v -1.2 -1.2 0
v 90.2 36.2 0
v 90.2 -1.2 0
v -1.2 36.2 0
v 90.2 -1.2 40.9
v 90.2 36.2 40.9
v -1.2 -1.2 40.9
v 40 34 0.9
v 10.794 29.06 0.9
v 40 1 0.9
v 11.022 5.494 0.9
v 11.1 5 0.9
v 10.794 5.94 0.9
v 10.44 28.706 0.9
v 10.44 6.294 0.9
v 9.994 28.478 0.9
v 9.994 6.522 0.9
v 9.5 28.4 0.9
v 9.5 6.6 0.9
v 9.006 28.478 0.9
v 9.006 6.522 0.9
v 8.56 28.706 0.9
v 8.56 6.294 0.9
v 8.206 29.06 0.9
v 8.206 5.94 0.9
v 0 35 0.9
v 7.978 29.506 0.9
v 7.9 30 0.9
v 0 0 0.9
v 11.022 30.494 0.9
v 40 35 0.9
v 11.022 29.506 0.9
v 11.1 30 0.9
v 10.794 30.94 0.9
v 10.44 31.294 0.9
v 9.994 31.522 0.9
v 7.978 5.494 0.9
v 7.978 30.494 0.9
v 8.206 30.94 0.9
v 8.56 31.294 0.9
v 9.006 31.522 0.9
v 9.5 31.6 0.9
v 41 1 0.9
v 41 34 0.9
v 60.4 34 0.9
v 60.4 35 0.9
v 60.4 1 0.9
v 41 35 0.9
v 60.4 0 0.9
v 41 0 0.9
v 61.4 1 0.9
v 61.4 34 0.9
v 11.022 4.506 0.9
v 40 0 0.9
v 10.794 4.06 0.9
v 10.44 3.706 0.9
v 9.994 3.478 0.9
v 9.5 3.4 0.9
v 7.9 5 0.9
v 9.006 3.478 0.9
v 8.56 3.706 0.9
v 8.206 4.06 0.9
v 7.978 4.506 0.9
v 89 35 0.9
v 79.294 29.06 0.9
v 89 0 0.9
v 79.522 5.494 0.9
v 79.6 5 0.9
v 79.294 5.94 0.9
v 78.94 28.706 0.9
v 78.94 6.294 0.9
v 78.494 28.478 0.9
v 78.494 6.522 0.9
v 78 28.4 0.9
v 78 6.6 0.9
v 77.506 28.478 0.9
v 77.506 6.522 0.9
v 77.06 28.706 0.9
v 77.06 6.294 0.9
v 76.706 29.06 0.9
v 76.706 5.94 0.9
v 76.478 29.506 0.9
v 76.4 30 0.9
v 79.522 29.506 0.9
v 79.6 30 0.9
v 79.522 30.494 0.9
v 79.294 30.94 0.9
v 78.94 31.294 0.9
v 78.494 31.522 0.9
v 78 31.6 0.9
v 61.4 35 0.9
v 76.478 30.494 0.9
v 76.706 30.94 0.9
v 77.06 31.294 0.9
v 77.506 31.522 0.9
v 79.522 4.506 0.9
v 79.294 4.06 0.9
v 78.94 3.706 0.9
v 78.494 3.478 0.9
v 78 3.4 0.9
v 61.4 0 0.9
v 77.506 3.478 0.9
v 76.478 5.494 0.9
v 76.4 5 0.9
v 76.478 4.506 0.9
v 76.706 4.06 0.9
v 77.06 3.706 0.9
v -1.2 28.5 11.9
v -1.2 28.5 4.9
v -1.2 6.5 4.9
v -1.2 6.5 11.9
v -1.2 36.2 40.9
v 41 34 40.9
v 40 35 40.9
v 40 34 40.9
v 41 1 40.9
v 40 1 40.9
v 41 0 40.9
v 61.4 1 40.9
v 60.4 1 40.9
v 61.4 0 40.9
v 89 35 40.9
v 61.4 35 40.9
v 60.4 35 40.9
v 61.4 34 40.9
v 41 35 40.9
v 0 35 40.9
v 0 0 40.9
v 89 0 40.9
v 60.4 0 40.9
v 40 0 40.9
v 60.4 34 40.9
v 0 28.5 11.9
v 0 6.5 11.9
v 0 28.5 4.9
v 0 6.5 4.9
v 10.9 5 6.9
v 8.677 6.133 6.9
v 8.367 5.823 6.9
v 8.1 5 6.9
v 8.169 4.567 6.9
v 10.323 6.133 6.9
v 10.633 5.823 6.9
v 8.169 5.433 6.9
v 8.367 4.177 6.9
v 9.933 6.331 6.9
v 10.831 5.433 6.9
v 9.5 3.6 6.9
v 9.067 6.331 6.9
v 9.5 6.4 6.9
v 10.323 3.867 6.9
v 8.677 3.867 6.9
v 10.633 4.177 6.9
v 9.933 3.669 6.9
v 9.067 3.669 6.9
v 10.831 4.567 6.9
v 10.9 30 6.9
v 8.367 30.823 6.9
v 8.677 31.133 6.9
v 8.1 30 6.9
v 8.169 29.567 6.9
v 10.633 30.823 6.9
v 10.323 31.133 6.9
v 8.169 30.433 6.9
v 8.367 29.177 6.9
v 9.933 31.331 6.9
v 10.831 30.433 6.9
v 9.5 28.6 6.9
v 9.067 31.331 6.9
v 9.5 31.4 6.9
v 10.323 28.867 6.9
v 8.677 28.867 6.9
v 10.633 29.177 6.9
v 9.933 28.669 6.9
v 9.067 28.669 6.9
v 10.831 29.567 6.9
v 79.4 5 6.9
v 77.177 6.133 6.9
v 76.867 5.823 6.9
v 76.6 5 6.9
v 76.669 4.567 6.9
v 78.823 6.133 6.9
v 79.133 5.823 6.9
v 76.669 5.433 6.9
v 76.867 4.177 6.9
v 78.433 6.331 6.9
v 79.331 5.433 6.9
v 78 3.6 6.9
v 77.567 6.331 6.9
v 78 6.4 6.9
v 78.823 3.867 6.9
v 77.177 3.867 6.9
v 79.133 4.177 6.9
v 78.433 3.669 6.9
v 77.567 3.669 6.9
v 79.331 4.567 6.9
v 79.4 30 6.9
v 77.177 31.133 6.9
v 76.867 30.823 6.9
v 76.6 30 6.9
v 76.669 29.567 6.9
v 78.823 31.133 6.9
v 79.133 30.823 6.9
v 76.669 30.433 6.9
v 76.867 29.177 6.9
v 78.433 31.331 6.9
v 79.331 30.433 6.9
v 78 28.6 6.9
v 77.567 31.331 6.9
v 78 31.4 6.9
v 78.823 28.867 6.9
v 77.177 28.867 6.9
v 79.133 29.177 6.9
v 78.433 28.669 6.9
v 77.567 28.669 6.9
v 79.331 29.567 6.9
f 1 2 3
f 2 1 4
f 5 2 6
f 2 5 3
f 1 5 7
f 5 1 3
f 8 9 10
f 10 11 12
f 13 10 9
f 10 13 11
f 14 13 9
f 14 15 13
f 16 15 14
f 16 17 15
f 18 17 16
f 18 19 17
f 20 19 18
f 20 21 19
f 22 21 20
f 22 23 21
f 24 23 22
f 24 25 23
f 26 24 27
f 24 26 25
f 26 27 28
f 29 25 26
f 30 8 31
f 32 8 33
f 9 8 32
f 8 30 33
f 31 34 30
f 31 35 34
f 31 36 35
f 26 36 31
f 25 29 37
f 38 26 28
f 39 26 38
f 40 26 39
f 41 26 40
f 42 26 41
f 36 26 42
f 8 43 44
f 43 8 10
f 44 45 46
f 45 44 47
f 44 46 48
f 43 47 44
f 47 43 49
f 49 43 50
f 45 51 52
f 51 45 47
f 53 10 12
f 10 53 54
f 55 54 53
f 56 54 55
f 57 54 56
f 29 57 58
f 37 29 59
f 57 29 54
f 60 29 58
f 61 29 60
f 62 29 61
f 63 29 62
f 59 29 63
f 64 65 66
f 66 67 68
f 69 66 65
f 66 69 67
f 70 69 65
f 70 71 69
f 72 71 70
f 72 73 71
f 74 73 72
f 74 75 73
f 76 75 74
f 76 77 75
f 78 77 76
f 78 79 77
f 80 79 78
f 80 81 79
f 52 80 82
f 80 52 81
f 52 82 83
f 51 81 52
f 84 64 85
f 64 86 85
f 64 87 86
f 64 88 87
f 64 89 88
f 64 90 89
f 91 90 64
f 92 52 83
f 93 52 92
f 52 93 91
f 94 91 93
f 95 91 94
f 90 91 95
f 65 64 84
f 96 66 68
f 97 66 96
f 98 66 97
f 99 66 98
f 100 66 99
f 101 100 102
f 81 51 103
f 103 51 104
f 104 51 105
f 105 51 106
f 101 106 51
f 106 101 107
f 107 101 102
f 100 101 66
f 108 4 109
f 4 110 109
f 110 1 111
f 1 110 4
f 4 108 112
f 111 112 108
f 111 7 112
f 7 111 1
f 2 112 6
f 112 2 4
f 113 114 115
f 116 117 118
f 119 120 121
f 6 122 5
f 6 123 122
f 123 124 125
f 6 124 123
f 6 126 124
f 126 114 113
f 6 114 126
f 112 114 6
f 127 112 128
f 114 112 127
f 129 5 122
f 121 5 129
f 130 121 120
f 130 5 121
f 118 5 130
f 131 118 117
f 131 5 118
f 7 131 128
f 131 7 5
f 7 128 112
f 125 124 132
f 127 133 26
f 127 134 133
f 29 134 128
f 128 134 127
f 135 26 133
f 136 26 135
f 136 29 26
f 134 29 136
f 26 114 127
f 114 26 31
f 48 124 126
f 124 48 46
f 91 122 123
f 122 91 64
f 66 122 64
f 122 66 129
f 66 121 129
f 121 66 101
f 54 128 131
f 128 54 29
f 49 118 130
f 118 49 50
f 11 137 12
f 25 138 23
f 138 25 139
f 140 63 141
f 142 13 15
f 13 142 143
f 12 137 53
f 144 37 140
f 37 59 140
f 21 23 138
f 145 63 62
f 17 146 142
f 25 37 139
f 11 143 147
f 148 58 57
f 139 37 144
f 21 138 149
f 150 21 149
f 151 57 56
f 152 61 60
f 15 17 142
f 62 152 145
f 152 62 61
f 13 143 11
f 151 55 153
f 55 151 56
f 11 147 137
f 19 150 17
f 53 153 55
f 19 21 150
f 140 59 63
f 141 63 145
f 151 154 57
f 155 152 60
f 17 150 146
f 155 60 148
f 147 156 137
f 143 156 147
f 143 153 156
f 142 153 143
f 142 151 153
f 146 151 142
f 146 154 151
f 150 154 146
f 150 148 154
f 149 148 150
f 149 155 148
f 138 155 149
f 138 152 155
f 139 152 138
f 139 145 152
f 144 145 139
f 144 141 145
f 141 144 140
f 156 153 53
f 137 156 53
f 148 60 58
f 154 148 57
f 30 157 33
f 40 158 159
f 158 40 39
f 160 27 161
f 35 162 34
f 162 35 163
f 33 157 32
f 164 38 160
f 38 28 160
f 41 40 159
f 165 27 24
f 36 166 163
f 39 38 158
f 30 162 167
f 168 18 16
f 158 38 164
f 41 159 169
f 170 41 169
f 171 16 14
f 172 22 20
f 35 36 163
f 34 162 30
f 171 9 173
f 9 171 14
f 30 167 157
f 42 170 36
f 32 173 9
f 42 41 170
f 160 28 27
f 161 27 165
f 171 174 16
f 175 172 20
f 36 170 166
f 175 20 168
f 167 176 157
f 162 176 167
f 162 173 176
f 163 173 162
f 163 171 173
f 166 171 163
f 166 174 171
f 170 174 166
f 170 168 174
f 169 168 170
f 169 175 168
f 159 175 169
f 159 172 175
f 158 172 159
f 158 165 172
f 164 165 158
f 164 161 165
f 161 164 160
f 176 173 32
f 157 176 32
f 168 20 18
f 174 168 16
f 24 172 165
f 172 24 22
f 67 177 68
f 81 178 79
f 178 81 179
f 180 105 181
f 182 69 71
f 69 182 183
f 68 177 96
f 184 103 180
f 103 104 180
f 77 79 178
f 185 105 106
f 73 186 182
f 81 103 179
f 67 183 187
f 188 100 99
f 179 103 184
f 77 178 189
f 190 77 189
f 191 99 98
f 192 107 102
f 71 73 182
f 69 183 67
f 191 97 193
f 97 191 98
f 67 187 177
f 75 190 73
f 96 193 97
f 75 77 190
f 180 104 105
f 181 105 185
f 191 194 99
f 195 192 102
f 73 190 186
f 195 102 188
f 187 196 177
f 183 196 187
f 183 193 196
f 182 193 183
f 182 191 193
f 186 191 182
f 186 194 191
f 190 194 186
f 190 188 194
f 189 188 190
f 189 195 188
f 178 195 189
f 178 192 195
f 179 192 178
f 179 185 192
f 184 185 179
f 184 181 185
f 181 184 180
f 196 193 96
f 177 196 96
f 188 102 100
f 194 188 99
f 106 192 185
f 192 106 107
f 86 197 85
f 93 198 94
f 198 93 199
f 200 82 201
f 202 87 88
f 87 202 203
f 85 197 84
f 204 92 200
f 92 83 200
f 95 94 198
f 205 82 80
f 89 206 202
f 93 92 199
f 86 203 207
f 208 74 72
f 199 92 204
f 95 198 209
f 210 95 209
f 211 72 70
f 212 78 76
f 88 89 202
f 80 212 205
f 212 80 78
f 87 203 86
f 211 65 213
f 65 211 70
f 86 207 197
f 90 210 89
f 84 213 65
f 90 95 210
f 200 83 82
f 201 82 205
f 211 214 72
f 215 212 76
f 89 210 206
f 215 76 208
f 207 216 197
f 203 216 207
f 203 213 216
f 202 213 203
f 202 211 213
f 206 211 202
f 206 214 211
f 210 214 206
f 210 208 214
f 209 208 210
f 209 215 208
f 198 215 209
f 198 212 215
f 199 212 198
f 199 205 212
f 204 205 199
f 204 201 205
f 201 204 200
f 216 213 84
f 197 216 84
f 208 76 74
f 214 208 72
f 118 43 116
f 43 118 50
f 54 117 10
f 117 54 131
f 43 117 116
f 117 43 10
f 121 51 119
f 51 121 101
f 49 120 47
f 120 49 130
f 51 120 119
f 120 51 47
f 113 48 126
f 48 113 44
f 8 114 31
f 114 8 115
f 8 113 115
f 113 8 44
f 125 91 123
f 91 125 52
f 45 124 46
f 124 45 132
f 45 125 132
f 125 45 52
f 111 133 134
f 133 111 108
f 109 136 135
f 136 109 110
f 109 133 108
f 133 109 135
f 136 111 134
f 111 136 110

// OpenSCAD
// A quick and dirty box for the PZEM-004t module and it's companion ESP-01 board (no cover).

largeur = 35;
longueur = 89;
hauteur = 40;

ep=1.2;
ep_fond=0.9;

diam_trou1 = 3.2;
diam_trou2 = 2.8;
hauteur_trou = 6;

difference() {
    union() {
        linear_extrude(height=ep_fond)
        offset(delta=ep)
        square([longueur, largeur]);

        linear_extrude(height=hauteur+ep_fond)
        difference() {
            offset(delta=ep) square([longueur, largeur]);
            square([longueur, largeur]);
        }

        translate([9.5, 5, ep_fond]) cylinder(d1=diam_trou1, d2=diam_trou2, h=hauteur_trou, $fn=20);
        translate([9.5, largeur-5, ep_fond]) cylinder(d1=diam_trou1, d2=diam_trou2, h=hauteur_trou, $fn=20);
        translate([9.5+68.5, 5, ep_fond]) cylinder(d1=diam_trou1, d2=diam_trou2, h=hauteur_trou, $fn=20);
        translate([9.5+68.5, largeur-5, ep_fond]) cylinder(d1=diam_trou1, d2=diam_trou2, h=hauteur_trou, $fn=20);

        translate([40, 0, ep_fond]) cube([1, 1, hauteur]);
        translate([60.4, 0, ep_fond]) cube([1, 1, hauteur]);
        translate([40, largeur-1, ep_fond]) cube([1, 1, hauteur]);
        translate([60.4, largeur-1, ep_fond]) cube([1, 1, hauteur]);
    }

    translate([-5, (largeur-22)/2, ep_fond+4]) cube([10, 22, 7]);
}
